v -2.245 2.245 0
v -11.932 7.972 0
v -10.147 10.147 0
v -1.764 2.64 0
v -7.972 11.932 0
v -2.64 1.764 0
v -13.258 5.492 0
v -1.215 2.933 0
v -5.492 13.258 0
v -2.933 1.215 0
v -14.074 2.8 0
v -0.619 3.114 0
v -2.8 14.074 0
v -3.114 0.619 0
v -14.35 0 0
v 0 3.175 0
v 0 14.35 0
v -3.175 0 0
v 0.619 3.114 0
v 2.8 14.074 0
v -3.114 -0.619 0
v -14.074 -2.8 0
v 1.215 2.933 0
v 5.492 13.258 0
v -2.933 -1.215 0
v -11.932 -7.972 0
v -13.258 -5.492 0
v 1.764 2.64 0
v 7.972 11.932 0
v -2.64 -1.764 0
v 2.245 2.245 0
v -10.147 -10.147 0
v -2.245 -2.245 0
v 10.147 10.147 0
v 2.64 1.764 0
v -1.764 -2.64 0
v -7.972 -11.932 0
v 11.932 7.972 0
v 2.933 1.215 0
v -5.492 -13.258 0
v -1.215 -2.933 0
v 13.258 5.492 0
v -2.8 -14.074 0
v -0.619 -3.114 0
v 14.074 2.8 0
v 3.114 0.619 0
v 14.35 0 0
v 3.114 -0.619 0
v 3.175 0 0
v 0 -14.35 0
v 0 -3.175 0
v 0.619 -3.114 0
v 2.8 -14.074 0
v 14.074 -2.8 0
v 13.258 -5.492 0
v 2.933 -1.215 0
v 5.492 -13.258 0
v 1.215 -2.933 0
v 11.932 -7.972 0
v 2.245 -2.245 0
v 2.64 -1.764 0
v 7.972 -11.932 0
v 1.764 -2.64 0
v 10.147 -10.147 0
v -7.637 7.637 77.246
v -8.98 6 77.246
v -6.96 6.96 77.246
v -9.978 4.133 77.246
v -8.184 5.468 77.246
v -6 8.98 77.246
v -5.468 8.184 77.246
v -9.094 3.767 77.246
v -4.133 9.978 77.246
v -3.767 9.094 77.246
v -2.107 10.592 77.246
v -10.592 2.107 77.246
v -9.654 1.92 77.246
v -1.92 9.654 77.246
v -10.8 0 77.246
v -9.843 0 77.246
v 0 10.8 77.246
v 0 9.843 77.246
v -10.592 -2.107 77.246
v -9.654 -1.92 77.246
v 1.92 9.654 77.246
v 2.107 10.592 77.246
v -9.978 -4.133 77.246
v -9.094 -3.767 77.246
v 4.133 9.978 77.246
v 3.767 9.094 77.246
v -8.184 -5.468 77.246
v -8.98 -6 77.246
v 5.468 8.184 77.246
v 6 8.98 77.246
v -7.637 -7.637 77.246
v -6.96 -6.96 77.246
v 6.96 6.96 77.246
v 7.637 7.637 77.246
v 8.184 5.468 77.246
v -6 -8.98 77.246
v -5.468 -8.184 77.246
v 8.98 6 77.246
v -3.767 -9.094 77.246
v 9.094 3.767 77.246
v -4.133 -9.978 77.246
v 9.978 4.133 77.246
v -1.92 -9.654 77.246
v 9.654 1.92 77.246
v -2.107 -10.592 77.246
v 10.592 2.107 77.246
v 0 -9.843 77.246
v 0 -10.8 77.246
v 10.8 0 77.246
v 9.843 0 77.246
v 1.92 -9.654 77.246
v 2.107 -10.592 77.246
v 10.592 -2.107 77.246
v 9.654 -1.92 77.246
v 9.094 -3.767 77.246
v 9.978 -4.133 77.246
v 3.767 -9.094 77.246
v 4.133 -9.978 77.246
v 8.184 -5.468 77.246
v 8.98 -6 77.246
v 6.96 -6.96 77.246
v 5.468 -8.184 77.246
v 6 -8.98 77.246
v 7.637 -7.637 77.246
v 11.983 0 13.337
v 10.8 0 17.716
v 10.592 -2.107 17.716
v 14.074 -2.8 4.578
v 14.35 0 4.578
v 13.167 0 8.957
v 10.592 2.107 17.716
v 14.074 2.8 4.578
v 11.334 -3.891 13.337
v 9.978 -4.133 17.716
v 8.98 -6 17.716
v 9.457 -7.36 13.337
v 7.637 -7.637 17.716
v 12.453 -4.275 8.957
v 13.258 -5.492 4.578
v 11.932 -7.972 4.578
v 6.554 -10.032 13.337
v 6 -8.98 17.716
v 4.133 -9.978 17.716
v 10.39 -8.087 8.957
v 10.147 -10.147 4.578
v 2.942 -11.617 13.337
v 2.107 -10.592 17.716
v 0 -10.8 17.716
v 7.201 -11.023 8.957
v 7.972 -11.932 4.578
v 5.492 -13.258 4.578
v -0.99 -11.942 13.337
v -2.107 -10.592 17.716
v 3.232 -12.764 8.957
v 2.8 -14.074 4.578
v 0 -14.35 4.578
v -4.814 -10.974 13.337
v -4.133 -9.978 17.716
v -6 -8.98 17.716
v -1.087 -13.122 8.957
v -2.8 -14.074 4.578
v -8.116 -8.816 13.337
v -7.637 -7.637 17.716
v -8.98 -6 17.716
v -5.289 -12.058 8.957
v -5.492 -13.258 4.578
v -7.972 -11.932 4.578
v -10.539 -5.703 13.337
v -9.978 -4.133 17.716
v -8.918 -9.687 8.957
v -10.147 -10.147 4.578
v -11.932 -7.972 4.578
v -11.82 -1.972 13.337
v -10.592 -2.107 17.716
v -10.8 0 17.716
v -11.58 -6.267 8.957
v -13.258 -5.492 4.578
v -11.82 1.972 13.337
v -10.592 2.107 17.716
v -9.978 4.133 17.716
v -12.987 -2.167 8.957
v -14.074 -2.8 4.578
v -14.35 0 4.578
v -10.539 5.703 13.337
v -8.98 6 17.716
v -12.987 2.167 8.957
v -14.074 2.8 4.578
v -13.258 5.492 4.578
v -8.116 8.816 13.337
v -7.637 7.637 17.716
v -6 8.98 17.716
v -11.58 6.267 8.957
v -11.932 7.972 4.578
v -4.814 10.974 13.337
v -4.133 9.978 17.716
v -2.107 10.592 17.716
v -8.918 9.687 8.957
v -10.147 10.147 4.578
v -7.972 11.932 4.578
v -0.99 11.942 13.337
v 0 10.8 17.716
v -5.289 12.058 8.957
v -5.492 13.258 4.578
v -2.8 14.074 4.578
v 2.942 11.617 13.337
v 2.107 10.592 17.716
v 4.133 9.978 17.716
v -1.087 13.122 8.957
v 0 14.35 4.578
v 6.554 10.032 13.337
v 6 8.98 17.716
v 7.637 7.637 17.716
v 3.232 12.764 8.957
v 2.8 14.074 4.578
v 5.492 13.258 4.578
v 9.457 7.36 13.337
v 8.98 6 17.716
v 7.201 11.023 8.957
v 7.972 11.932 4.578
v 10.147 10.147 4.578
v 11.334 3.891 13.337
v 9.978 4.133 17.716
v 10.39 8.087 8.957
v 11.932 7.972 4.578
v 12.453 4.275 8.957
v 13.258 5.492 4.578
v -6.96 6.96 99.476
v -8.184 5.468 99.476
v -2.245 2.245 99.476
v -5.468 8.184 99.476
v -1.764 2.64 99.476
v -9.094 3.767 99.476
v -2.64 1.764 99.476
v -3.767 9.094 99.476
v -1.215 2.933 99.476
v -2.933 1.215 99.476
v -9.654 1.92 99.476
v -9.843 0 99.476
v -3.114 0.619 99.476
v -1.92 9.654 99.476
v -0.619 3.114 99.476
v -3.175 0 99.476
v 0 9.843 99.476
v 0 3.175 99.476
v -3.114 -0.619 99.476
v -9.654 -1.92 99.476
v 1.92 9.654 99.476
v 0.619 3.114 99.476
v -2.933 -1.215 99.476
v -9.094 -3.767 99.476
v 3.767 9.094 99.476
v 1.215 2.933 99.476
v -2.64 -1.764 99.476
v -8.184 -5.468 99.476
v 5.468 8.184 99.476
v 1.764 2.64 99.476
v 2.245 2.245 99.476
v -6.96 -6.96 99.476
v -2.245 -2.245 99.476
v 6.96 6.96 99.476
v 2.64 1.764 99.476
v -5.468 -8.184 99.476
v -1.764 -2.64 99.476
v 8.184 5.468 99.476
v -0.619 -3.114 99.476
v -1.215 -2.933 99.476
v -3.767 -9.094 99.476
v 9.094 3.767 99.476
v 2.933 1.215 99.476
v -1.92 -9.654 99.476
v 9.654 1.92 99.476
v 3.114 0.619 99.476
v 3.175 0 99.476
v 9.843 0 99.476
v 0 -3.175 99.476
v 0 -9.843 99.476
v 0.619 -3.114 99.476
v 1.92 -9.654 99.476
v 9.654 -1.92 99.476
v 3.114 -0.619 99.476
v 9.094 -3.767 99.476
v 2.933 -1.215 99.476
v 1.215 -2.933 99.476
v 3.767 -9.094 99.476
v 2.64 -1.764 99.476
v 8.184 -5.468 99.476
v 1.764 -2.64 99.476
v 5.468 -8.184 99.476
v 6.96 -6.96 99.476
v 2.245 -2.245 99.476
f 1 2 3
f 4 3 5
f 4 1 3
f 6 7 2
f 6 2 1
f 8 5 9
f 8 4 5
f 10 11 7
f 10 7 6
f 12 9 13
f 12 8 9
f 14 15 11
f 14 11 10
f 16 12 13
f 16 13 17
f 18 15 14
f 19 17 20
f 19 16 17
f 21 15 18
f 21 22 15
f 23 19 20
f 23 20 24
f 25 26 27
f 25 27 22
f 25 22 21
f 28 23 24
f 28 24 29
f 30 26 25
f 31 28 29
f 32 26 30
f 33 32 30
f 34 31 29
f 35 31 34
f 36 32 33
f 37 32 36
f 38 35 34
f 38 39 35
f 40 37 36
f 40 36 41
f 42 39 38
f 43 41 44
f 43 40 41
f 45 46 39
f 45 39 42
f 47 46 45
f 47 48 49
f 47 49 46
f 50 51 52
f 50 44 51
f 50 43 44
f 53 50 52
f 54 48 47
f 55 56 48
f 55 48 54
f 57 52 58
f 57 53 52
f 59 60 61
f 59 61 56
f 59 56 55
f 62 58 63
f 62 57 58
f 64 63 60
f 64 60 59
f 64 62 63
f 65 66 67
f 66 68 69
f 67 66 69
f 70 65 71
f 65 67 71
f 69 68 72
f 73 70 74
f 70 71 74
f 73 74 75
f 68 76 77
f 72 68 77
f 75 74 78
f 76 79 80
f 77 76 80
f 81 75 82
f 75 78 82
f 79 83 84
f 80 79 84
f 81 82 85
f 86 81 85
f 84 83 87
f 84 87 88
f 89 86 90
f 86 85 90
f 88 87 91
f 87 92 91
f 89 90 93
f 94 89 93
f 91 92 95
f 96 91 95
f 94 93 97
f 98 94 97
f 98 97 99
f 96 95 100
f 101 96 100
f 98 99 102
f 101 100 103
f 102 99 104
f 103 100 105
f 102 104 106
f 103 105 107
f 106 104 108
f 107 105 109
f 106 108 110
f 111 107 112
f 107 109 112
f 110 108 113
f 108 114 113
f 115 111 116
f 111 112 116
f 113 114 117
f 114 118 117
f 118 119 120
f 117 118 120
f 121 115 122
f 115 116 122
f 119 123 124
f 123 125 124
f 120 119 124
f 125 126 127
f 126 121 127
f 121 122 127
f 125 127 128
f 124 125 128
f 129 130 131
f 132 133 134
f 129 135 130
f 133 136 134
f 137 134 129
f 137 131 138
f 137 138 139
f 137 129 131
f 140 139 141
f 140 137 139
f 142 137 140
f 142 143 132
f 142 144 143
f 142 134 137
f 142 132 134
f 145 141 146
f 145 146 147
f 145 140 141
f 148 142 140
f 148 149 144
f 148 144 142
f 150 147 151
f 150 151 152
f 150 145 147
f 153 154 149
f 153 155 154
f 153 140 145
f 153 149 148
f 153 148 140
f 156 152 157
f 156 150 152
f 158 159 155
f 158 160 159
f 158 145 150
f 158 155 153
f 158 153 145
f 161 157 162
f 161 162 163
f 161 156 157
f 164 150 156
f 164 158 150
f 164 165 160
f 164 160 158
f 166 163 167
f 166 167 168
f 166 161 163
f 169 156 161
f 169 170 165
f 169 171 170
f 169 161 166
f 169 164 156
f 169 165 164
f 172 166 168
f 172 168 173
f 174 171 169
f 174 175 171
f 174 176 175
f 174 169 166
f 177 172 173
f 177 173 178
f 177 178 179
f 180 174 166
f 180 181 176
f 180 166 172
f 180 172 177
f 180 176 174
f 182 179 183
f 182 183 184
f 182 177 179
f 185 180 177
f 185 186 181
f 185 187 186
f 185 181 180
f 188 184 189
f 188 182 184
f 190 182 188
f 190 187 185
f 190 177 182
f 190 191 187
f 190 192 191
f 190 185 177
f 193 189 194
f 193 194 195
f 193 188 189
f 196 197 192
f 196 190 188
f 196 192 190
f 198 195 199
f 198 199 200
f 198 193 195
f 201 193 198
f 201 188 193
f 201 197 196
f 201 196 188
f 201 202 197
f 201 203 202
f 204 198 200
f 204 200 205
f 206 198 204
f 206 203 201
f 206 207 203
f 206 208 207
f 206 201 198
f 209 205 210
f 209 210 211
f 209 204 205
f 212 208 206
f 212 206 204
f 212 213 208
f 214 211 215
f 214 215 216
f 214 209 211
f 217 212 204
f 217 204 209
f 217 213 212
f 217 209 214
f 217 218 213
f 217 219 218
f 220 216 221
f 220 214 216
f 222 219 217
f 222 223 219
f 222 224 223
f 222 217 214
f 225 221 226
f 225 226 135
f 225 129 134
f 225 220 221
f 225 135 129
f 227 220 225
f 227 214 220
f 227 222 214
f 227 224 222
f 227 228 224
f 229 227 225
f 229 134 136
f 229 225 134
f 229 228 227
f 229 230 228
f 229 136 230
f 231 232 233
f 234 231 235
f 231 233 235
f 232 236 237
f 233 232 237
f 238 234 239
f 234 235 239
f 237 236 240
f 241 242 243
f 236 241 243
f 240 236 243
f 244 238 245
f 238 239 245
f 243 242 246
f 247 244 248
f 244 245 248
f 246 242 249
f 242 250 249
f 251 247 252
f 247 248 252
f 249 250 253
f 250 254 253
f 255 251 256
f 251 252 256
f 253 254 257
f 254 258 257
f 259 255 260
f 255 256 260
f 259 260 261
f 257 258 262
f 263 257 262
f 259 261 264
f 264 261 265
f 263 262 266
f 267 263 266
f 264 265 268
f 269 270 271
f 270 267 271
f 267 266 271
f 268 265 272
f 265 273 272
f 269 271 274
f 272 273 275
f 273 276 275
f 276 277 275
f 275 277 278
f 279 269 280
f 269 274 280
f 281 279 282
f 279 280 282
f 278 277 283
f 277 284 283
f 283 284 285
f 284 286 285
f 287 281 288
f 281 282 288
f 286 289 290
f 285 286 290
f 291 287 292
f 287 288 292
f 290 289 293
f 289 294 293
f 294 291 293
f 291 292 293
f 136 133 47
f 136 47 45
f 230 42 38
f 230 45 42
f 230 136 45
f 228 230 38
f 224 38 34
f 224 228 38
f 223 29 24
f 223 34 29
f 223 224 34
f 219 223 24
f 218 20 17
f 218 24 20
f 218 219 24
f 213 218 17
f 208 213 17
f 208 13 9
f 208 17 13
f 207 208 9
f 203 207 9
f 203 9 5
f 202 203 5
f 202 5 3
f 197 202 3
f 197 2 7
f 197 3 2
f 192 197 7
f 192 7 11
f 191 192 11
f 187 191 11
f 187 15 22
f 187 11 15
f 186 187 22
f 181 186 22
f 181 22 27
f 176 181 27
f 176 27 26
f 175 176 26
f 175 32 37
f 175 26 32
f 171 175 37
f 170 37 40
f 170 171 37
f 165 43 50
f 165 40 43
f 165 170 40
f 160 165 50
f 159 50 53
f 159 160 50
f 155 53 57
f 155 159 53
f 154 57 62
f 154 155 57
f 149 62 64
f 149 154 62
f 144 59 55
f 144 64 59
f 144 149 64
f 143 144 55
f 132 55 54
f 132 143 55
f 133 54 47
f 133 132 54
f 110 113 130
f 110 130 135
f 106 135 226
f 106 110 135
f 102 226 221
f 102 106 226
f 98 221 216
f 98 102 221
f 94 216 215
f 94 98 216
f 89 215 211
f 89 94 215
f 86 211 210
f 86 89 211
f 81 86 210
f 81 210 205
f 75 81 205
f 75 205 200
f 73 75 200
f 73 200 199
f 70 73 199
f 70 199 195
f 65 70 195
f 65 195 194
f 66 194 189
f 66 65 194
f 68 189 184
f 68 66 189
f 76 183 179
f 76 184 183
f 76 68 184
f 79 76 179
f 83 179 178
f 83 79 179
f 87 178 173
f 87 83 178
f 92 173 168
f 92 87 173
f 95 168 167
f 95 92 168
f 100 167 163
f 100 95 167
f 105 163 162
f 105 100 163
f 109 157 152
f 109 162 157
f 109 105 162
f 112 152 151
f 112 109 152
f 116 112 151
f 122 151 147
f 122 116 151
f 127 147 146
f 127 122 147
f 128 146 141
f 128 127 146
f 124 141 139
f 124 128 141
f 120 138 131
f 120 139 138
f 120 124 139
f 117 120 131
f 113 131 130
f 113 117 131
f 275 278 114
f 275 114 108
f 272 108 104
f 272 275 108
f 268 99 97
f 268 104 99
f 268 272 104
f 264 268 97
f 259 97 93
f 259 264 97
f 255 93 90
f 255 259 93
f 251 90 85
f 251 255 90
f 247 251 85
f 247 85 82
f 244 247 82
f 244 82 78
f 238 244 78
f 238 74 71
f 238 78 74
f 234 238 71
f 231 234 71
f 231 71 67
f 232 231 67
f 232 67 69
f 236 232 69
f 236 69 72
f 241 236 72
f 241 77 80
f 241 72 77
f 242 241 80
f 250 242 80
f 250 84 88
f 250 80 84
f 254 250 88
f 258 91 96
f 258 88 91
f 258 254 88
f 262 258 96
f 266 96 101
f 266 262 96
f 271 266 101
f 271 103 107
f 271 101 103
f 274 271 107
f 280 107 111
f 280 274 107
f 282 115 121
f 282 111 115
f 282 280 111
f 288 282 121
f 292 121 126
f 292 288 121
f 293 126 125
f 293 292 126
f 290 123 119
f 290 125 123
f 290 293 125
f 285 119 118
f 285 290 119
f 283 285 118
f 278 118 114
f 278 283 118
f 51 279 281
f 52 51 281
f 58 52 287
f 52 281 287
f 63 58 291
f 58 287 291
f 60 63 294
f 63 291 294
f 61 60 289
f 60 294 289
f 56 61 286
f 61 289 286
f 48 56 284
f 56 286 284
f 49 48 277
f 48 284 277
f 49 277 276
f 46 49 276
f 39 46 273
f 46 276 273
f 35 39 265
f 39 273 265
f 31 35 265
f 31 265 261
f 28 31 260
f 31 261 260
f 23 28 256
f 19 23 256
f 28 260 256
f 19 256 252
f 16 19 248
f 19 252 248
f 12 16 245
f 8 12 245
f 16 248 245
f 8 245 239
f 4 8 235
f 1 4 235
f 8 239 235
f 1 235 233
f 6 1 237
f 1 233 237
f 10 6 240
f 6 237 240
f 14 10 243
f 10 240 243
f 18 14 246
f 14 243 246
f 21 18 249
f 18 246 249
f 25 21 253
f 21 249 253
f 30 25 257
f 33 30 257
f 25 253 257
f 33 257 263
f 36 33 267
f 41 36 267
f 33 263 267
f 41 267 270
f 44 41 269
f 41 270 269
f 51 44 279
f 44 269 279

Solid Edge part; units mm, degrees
sketch "Sketch1" plane through (0, 0, 0) normal (0, -1, 0) x (1, 0, 0)
  line L0 (0, 0) -> (14.35, 0)
  line L1 (14.35, 0) -> (14.35, 4.5777)
  line L2 (14.35, 4.5777) -> (10.8, 17.7163)
  line L3 (10.8, 17.7163) -> (10.8, 99.4763)
  line L4 (10.8, 99.4763) -> (0, 99.4763)
  line L5 (0, 99.4763) -> (0, 0)
  dimension "D1" = 14.35
  dimension "D2" = 4.5777
  dimension "D3" = 10.8
  dimension "D4" = 81.76
revolve "RevolvedProtrusion1" add sketch "Sketch1" angle 360 about axis through (0, 0, 54) along (0, 0, -1)
sketch "Sketch2" plane through (0, 0, 0) normal (0, -1, 0) x (1, 0, 0)
  line L0 (10.8, 99.4763) -> (10.8, 77.2463)
  line L1 (10.8, 77.2463) -> (9.843, 77.2463)
  line L2 (9.843, 77.2463) -> (9.843, 99.4763)
  line L3 (9.843, 99.4763) -> (10.8, 99.4763)
  dimension "D1" = 22.23
  dimension "D2" = 9.843
revolve "RevolvedCutout1" cut sketch "Sketch2" angle 360 about axis through (0, 0, 54) along (0, 0, -1)
hole "Hole1" at (0, 0, 99.4763) direction (0, 0, -1) diameter 6.35 end up to next
